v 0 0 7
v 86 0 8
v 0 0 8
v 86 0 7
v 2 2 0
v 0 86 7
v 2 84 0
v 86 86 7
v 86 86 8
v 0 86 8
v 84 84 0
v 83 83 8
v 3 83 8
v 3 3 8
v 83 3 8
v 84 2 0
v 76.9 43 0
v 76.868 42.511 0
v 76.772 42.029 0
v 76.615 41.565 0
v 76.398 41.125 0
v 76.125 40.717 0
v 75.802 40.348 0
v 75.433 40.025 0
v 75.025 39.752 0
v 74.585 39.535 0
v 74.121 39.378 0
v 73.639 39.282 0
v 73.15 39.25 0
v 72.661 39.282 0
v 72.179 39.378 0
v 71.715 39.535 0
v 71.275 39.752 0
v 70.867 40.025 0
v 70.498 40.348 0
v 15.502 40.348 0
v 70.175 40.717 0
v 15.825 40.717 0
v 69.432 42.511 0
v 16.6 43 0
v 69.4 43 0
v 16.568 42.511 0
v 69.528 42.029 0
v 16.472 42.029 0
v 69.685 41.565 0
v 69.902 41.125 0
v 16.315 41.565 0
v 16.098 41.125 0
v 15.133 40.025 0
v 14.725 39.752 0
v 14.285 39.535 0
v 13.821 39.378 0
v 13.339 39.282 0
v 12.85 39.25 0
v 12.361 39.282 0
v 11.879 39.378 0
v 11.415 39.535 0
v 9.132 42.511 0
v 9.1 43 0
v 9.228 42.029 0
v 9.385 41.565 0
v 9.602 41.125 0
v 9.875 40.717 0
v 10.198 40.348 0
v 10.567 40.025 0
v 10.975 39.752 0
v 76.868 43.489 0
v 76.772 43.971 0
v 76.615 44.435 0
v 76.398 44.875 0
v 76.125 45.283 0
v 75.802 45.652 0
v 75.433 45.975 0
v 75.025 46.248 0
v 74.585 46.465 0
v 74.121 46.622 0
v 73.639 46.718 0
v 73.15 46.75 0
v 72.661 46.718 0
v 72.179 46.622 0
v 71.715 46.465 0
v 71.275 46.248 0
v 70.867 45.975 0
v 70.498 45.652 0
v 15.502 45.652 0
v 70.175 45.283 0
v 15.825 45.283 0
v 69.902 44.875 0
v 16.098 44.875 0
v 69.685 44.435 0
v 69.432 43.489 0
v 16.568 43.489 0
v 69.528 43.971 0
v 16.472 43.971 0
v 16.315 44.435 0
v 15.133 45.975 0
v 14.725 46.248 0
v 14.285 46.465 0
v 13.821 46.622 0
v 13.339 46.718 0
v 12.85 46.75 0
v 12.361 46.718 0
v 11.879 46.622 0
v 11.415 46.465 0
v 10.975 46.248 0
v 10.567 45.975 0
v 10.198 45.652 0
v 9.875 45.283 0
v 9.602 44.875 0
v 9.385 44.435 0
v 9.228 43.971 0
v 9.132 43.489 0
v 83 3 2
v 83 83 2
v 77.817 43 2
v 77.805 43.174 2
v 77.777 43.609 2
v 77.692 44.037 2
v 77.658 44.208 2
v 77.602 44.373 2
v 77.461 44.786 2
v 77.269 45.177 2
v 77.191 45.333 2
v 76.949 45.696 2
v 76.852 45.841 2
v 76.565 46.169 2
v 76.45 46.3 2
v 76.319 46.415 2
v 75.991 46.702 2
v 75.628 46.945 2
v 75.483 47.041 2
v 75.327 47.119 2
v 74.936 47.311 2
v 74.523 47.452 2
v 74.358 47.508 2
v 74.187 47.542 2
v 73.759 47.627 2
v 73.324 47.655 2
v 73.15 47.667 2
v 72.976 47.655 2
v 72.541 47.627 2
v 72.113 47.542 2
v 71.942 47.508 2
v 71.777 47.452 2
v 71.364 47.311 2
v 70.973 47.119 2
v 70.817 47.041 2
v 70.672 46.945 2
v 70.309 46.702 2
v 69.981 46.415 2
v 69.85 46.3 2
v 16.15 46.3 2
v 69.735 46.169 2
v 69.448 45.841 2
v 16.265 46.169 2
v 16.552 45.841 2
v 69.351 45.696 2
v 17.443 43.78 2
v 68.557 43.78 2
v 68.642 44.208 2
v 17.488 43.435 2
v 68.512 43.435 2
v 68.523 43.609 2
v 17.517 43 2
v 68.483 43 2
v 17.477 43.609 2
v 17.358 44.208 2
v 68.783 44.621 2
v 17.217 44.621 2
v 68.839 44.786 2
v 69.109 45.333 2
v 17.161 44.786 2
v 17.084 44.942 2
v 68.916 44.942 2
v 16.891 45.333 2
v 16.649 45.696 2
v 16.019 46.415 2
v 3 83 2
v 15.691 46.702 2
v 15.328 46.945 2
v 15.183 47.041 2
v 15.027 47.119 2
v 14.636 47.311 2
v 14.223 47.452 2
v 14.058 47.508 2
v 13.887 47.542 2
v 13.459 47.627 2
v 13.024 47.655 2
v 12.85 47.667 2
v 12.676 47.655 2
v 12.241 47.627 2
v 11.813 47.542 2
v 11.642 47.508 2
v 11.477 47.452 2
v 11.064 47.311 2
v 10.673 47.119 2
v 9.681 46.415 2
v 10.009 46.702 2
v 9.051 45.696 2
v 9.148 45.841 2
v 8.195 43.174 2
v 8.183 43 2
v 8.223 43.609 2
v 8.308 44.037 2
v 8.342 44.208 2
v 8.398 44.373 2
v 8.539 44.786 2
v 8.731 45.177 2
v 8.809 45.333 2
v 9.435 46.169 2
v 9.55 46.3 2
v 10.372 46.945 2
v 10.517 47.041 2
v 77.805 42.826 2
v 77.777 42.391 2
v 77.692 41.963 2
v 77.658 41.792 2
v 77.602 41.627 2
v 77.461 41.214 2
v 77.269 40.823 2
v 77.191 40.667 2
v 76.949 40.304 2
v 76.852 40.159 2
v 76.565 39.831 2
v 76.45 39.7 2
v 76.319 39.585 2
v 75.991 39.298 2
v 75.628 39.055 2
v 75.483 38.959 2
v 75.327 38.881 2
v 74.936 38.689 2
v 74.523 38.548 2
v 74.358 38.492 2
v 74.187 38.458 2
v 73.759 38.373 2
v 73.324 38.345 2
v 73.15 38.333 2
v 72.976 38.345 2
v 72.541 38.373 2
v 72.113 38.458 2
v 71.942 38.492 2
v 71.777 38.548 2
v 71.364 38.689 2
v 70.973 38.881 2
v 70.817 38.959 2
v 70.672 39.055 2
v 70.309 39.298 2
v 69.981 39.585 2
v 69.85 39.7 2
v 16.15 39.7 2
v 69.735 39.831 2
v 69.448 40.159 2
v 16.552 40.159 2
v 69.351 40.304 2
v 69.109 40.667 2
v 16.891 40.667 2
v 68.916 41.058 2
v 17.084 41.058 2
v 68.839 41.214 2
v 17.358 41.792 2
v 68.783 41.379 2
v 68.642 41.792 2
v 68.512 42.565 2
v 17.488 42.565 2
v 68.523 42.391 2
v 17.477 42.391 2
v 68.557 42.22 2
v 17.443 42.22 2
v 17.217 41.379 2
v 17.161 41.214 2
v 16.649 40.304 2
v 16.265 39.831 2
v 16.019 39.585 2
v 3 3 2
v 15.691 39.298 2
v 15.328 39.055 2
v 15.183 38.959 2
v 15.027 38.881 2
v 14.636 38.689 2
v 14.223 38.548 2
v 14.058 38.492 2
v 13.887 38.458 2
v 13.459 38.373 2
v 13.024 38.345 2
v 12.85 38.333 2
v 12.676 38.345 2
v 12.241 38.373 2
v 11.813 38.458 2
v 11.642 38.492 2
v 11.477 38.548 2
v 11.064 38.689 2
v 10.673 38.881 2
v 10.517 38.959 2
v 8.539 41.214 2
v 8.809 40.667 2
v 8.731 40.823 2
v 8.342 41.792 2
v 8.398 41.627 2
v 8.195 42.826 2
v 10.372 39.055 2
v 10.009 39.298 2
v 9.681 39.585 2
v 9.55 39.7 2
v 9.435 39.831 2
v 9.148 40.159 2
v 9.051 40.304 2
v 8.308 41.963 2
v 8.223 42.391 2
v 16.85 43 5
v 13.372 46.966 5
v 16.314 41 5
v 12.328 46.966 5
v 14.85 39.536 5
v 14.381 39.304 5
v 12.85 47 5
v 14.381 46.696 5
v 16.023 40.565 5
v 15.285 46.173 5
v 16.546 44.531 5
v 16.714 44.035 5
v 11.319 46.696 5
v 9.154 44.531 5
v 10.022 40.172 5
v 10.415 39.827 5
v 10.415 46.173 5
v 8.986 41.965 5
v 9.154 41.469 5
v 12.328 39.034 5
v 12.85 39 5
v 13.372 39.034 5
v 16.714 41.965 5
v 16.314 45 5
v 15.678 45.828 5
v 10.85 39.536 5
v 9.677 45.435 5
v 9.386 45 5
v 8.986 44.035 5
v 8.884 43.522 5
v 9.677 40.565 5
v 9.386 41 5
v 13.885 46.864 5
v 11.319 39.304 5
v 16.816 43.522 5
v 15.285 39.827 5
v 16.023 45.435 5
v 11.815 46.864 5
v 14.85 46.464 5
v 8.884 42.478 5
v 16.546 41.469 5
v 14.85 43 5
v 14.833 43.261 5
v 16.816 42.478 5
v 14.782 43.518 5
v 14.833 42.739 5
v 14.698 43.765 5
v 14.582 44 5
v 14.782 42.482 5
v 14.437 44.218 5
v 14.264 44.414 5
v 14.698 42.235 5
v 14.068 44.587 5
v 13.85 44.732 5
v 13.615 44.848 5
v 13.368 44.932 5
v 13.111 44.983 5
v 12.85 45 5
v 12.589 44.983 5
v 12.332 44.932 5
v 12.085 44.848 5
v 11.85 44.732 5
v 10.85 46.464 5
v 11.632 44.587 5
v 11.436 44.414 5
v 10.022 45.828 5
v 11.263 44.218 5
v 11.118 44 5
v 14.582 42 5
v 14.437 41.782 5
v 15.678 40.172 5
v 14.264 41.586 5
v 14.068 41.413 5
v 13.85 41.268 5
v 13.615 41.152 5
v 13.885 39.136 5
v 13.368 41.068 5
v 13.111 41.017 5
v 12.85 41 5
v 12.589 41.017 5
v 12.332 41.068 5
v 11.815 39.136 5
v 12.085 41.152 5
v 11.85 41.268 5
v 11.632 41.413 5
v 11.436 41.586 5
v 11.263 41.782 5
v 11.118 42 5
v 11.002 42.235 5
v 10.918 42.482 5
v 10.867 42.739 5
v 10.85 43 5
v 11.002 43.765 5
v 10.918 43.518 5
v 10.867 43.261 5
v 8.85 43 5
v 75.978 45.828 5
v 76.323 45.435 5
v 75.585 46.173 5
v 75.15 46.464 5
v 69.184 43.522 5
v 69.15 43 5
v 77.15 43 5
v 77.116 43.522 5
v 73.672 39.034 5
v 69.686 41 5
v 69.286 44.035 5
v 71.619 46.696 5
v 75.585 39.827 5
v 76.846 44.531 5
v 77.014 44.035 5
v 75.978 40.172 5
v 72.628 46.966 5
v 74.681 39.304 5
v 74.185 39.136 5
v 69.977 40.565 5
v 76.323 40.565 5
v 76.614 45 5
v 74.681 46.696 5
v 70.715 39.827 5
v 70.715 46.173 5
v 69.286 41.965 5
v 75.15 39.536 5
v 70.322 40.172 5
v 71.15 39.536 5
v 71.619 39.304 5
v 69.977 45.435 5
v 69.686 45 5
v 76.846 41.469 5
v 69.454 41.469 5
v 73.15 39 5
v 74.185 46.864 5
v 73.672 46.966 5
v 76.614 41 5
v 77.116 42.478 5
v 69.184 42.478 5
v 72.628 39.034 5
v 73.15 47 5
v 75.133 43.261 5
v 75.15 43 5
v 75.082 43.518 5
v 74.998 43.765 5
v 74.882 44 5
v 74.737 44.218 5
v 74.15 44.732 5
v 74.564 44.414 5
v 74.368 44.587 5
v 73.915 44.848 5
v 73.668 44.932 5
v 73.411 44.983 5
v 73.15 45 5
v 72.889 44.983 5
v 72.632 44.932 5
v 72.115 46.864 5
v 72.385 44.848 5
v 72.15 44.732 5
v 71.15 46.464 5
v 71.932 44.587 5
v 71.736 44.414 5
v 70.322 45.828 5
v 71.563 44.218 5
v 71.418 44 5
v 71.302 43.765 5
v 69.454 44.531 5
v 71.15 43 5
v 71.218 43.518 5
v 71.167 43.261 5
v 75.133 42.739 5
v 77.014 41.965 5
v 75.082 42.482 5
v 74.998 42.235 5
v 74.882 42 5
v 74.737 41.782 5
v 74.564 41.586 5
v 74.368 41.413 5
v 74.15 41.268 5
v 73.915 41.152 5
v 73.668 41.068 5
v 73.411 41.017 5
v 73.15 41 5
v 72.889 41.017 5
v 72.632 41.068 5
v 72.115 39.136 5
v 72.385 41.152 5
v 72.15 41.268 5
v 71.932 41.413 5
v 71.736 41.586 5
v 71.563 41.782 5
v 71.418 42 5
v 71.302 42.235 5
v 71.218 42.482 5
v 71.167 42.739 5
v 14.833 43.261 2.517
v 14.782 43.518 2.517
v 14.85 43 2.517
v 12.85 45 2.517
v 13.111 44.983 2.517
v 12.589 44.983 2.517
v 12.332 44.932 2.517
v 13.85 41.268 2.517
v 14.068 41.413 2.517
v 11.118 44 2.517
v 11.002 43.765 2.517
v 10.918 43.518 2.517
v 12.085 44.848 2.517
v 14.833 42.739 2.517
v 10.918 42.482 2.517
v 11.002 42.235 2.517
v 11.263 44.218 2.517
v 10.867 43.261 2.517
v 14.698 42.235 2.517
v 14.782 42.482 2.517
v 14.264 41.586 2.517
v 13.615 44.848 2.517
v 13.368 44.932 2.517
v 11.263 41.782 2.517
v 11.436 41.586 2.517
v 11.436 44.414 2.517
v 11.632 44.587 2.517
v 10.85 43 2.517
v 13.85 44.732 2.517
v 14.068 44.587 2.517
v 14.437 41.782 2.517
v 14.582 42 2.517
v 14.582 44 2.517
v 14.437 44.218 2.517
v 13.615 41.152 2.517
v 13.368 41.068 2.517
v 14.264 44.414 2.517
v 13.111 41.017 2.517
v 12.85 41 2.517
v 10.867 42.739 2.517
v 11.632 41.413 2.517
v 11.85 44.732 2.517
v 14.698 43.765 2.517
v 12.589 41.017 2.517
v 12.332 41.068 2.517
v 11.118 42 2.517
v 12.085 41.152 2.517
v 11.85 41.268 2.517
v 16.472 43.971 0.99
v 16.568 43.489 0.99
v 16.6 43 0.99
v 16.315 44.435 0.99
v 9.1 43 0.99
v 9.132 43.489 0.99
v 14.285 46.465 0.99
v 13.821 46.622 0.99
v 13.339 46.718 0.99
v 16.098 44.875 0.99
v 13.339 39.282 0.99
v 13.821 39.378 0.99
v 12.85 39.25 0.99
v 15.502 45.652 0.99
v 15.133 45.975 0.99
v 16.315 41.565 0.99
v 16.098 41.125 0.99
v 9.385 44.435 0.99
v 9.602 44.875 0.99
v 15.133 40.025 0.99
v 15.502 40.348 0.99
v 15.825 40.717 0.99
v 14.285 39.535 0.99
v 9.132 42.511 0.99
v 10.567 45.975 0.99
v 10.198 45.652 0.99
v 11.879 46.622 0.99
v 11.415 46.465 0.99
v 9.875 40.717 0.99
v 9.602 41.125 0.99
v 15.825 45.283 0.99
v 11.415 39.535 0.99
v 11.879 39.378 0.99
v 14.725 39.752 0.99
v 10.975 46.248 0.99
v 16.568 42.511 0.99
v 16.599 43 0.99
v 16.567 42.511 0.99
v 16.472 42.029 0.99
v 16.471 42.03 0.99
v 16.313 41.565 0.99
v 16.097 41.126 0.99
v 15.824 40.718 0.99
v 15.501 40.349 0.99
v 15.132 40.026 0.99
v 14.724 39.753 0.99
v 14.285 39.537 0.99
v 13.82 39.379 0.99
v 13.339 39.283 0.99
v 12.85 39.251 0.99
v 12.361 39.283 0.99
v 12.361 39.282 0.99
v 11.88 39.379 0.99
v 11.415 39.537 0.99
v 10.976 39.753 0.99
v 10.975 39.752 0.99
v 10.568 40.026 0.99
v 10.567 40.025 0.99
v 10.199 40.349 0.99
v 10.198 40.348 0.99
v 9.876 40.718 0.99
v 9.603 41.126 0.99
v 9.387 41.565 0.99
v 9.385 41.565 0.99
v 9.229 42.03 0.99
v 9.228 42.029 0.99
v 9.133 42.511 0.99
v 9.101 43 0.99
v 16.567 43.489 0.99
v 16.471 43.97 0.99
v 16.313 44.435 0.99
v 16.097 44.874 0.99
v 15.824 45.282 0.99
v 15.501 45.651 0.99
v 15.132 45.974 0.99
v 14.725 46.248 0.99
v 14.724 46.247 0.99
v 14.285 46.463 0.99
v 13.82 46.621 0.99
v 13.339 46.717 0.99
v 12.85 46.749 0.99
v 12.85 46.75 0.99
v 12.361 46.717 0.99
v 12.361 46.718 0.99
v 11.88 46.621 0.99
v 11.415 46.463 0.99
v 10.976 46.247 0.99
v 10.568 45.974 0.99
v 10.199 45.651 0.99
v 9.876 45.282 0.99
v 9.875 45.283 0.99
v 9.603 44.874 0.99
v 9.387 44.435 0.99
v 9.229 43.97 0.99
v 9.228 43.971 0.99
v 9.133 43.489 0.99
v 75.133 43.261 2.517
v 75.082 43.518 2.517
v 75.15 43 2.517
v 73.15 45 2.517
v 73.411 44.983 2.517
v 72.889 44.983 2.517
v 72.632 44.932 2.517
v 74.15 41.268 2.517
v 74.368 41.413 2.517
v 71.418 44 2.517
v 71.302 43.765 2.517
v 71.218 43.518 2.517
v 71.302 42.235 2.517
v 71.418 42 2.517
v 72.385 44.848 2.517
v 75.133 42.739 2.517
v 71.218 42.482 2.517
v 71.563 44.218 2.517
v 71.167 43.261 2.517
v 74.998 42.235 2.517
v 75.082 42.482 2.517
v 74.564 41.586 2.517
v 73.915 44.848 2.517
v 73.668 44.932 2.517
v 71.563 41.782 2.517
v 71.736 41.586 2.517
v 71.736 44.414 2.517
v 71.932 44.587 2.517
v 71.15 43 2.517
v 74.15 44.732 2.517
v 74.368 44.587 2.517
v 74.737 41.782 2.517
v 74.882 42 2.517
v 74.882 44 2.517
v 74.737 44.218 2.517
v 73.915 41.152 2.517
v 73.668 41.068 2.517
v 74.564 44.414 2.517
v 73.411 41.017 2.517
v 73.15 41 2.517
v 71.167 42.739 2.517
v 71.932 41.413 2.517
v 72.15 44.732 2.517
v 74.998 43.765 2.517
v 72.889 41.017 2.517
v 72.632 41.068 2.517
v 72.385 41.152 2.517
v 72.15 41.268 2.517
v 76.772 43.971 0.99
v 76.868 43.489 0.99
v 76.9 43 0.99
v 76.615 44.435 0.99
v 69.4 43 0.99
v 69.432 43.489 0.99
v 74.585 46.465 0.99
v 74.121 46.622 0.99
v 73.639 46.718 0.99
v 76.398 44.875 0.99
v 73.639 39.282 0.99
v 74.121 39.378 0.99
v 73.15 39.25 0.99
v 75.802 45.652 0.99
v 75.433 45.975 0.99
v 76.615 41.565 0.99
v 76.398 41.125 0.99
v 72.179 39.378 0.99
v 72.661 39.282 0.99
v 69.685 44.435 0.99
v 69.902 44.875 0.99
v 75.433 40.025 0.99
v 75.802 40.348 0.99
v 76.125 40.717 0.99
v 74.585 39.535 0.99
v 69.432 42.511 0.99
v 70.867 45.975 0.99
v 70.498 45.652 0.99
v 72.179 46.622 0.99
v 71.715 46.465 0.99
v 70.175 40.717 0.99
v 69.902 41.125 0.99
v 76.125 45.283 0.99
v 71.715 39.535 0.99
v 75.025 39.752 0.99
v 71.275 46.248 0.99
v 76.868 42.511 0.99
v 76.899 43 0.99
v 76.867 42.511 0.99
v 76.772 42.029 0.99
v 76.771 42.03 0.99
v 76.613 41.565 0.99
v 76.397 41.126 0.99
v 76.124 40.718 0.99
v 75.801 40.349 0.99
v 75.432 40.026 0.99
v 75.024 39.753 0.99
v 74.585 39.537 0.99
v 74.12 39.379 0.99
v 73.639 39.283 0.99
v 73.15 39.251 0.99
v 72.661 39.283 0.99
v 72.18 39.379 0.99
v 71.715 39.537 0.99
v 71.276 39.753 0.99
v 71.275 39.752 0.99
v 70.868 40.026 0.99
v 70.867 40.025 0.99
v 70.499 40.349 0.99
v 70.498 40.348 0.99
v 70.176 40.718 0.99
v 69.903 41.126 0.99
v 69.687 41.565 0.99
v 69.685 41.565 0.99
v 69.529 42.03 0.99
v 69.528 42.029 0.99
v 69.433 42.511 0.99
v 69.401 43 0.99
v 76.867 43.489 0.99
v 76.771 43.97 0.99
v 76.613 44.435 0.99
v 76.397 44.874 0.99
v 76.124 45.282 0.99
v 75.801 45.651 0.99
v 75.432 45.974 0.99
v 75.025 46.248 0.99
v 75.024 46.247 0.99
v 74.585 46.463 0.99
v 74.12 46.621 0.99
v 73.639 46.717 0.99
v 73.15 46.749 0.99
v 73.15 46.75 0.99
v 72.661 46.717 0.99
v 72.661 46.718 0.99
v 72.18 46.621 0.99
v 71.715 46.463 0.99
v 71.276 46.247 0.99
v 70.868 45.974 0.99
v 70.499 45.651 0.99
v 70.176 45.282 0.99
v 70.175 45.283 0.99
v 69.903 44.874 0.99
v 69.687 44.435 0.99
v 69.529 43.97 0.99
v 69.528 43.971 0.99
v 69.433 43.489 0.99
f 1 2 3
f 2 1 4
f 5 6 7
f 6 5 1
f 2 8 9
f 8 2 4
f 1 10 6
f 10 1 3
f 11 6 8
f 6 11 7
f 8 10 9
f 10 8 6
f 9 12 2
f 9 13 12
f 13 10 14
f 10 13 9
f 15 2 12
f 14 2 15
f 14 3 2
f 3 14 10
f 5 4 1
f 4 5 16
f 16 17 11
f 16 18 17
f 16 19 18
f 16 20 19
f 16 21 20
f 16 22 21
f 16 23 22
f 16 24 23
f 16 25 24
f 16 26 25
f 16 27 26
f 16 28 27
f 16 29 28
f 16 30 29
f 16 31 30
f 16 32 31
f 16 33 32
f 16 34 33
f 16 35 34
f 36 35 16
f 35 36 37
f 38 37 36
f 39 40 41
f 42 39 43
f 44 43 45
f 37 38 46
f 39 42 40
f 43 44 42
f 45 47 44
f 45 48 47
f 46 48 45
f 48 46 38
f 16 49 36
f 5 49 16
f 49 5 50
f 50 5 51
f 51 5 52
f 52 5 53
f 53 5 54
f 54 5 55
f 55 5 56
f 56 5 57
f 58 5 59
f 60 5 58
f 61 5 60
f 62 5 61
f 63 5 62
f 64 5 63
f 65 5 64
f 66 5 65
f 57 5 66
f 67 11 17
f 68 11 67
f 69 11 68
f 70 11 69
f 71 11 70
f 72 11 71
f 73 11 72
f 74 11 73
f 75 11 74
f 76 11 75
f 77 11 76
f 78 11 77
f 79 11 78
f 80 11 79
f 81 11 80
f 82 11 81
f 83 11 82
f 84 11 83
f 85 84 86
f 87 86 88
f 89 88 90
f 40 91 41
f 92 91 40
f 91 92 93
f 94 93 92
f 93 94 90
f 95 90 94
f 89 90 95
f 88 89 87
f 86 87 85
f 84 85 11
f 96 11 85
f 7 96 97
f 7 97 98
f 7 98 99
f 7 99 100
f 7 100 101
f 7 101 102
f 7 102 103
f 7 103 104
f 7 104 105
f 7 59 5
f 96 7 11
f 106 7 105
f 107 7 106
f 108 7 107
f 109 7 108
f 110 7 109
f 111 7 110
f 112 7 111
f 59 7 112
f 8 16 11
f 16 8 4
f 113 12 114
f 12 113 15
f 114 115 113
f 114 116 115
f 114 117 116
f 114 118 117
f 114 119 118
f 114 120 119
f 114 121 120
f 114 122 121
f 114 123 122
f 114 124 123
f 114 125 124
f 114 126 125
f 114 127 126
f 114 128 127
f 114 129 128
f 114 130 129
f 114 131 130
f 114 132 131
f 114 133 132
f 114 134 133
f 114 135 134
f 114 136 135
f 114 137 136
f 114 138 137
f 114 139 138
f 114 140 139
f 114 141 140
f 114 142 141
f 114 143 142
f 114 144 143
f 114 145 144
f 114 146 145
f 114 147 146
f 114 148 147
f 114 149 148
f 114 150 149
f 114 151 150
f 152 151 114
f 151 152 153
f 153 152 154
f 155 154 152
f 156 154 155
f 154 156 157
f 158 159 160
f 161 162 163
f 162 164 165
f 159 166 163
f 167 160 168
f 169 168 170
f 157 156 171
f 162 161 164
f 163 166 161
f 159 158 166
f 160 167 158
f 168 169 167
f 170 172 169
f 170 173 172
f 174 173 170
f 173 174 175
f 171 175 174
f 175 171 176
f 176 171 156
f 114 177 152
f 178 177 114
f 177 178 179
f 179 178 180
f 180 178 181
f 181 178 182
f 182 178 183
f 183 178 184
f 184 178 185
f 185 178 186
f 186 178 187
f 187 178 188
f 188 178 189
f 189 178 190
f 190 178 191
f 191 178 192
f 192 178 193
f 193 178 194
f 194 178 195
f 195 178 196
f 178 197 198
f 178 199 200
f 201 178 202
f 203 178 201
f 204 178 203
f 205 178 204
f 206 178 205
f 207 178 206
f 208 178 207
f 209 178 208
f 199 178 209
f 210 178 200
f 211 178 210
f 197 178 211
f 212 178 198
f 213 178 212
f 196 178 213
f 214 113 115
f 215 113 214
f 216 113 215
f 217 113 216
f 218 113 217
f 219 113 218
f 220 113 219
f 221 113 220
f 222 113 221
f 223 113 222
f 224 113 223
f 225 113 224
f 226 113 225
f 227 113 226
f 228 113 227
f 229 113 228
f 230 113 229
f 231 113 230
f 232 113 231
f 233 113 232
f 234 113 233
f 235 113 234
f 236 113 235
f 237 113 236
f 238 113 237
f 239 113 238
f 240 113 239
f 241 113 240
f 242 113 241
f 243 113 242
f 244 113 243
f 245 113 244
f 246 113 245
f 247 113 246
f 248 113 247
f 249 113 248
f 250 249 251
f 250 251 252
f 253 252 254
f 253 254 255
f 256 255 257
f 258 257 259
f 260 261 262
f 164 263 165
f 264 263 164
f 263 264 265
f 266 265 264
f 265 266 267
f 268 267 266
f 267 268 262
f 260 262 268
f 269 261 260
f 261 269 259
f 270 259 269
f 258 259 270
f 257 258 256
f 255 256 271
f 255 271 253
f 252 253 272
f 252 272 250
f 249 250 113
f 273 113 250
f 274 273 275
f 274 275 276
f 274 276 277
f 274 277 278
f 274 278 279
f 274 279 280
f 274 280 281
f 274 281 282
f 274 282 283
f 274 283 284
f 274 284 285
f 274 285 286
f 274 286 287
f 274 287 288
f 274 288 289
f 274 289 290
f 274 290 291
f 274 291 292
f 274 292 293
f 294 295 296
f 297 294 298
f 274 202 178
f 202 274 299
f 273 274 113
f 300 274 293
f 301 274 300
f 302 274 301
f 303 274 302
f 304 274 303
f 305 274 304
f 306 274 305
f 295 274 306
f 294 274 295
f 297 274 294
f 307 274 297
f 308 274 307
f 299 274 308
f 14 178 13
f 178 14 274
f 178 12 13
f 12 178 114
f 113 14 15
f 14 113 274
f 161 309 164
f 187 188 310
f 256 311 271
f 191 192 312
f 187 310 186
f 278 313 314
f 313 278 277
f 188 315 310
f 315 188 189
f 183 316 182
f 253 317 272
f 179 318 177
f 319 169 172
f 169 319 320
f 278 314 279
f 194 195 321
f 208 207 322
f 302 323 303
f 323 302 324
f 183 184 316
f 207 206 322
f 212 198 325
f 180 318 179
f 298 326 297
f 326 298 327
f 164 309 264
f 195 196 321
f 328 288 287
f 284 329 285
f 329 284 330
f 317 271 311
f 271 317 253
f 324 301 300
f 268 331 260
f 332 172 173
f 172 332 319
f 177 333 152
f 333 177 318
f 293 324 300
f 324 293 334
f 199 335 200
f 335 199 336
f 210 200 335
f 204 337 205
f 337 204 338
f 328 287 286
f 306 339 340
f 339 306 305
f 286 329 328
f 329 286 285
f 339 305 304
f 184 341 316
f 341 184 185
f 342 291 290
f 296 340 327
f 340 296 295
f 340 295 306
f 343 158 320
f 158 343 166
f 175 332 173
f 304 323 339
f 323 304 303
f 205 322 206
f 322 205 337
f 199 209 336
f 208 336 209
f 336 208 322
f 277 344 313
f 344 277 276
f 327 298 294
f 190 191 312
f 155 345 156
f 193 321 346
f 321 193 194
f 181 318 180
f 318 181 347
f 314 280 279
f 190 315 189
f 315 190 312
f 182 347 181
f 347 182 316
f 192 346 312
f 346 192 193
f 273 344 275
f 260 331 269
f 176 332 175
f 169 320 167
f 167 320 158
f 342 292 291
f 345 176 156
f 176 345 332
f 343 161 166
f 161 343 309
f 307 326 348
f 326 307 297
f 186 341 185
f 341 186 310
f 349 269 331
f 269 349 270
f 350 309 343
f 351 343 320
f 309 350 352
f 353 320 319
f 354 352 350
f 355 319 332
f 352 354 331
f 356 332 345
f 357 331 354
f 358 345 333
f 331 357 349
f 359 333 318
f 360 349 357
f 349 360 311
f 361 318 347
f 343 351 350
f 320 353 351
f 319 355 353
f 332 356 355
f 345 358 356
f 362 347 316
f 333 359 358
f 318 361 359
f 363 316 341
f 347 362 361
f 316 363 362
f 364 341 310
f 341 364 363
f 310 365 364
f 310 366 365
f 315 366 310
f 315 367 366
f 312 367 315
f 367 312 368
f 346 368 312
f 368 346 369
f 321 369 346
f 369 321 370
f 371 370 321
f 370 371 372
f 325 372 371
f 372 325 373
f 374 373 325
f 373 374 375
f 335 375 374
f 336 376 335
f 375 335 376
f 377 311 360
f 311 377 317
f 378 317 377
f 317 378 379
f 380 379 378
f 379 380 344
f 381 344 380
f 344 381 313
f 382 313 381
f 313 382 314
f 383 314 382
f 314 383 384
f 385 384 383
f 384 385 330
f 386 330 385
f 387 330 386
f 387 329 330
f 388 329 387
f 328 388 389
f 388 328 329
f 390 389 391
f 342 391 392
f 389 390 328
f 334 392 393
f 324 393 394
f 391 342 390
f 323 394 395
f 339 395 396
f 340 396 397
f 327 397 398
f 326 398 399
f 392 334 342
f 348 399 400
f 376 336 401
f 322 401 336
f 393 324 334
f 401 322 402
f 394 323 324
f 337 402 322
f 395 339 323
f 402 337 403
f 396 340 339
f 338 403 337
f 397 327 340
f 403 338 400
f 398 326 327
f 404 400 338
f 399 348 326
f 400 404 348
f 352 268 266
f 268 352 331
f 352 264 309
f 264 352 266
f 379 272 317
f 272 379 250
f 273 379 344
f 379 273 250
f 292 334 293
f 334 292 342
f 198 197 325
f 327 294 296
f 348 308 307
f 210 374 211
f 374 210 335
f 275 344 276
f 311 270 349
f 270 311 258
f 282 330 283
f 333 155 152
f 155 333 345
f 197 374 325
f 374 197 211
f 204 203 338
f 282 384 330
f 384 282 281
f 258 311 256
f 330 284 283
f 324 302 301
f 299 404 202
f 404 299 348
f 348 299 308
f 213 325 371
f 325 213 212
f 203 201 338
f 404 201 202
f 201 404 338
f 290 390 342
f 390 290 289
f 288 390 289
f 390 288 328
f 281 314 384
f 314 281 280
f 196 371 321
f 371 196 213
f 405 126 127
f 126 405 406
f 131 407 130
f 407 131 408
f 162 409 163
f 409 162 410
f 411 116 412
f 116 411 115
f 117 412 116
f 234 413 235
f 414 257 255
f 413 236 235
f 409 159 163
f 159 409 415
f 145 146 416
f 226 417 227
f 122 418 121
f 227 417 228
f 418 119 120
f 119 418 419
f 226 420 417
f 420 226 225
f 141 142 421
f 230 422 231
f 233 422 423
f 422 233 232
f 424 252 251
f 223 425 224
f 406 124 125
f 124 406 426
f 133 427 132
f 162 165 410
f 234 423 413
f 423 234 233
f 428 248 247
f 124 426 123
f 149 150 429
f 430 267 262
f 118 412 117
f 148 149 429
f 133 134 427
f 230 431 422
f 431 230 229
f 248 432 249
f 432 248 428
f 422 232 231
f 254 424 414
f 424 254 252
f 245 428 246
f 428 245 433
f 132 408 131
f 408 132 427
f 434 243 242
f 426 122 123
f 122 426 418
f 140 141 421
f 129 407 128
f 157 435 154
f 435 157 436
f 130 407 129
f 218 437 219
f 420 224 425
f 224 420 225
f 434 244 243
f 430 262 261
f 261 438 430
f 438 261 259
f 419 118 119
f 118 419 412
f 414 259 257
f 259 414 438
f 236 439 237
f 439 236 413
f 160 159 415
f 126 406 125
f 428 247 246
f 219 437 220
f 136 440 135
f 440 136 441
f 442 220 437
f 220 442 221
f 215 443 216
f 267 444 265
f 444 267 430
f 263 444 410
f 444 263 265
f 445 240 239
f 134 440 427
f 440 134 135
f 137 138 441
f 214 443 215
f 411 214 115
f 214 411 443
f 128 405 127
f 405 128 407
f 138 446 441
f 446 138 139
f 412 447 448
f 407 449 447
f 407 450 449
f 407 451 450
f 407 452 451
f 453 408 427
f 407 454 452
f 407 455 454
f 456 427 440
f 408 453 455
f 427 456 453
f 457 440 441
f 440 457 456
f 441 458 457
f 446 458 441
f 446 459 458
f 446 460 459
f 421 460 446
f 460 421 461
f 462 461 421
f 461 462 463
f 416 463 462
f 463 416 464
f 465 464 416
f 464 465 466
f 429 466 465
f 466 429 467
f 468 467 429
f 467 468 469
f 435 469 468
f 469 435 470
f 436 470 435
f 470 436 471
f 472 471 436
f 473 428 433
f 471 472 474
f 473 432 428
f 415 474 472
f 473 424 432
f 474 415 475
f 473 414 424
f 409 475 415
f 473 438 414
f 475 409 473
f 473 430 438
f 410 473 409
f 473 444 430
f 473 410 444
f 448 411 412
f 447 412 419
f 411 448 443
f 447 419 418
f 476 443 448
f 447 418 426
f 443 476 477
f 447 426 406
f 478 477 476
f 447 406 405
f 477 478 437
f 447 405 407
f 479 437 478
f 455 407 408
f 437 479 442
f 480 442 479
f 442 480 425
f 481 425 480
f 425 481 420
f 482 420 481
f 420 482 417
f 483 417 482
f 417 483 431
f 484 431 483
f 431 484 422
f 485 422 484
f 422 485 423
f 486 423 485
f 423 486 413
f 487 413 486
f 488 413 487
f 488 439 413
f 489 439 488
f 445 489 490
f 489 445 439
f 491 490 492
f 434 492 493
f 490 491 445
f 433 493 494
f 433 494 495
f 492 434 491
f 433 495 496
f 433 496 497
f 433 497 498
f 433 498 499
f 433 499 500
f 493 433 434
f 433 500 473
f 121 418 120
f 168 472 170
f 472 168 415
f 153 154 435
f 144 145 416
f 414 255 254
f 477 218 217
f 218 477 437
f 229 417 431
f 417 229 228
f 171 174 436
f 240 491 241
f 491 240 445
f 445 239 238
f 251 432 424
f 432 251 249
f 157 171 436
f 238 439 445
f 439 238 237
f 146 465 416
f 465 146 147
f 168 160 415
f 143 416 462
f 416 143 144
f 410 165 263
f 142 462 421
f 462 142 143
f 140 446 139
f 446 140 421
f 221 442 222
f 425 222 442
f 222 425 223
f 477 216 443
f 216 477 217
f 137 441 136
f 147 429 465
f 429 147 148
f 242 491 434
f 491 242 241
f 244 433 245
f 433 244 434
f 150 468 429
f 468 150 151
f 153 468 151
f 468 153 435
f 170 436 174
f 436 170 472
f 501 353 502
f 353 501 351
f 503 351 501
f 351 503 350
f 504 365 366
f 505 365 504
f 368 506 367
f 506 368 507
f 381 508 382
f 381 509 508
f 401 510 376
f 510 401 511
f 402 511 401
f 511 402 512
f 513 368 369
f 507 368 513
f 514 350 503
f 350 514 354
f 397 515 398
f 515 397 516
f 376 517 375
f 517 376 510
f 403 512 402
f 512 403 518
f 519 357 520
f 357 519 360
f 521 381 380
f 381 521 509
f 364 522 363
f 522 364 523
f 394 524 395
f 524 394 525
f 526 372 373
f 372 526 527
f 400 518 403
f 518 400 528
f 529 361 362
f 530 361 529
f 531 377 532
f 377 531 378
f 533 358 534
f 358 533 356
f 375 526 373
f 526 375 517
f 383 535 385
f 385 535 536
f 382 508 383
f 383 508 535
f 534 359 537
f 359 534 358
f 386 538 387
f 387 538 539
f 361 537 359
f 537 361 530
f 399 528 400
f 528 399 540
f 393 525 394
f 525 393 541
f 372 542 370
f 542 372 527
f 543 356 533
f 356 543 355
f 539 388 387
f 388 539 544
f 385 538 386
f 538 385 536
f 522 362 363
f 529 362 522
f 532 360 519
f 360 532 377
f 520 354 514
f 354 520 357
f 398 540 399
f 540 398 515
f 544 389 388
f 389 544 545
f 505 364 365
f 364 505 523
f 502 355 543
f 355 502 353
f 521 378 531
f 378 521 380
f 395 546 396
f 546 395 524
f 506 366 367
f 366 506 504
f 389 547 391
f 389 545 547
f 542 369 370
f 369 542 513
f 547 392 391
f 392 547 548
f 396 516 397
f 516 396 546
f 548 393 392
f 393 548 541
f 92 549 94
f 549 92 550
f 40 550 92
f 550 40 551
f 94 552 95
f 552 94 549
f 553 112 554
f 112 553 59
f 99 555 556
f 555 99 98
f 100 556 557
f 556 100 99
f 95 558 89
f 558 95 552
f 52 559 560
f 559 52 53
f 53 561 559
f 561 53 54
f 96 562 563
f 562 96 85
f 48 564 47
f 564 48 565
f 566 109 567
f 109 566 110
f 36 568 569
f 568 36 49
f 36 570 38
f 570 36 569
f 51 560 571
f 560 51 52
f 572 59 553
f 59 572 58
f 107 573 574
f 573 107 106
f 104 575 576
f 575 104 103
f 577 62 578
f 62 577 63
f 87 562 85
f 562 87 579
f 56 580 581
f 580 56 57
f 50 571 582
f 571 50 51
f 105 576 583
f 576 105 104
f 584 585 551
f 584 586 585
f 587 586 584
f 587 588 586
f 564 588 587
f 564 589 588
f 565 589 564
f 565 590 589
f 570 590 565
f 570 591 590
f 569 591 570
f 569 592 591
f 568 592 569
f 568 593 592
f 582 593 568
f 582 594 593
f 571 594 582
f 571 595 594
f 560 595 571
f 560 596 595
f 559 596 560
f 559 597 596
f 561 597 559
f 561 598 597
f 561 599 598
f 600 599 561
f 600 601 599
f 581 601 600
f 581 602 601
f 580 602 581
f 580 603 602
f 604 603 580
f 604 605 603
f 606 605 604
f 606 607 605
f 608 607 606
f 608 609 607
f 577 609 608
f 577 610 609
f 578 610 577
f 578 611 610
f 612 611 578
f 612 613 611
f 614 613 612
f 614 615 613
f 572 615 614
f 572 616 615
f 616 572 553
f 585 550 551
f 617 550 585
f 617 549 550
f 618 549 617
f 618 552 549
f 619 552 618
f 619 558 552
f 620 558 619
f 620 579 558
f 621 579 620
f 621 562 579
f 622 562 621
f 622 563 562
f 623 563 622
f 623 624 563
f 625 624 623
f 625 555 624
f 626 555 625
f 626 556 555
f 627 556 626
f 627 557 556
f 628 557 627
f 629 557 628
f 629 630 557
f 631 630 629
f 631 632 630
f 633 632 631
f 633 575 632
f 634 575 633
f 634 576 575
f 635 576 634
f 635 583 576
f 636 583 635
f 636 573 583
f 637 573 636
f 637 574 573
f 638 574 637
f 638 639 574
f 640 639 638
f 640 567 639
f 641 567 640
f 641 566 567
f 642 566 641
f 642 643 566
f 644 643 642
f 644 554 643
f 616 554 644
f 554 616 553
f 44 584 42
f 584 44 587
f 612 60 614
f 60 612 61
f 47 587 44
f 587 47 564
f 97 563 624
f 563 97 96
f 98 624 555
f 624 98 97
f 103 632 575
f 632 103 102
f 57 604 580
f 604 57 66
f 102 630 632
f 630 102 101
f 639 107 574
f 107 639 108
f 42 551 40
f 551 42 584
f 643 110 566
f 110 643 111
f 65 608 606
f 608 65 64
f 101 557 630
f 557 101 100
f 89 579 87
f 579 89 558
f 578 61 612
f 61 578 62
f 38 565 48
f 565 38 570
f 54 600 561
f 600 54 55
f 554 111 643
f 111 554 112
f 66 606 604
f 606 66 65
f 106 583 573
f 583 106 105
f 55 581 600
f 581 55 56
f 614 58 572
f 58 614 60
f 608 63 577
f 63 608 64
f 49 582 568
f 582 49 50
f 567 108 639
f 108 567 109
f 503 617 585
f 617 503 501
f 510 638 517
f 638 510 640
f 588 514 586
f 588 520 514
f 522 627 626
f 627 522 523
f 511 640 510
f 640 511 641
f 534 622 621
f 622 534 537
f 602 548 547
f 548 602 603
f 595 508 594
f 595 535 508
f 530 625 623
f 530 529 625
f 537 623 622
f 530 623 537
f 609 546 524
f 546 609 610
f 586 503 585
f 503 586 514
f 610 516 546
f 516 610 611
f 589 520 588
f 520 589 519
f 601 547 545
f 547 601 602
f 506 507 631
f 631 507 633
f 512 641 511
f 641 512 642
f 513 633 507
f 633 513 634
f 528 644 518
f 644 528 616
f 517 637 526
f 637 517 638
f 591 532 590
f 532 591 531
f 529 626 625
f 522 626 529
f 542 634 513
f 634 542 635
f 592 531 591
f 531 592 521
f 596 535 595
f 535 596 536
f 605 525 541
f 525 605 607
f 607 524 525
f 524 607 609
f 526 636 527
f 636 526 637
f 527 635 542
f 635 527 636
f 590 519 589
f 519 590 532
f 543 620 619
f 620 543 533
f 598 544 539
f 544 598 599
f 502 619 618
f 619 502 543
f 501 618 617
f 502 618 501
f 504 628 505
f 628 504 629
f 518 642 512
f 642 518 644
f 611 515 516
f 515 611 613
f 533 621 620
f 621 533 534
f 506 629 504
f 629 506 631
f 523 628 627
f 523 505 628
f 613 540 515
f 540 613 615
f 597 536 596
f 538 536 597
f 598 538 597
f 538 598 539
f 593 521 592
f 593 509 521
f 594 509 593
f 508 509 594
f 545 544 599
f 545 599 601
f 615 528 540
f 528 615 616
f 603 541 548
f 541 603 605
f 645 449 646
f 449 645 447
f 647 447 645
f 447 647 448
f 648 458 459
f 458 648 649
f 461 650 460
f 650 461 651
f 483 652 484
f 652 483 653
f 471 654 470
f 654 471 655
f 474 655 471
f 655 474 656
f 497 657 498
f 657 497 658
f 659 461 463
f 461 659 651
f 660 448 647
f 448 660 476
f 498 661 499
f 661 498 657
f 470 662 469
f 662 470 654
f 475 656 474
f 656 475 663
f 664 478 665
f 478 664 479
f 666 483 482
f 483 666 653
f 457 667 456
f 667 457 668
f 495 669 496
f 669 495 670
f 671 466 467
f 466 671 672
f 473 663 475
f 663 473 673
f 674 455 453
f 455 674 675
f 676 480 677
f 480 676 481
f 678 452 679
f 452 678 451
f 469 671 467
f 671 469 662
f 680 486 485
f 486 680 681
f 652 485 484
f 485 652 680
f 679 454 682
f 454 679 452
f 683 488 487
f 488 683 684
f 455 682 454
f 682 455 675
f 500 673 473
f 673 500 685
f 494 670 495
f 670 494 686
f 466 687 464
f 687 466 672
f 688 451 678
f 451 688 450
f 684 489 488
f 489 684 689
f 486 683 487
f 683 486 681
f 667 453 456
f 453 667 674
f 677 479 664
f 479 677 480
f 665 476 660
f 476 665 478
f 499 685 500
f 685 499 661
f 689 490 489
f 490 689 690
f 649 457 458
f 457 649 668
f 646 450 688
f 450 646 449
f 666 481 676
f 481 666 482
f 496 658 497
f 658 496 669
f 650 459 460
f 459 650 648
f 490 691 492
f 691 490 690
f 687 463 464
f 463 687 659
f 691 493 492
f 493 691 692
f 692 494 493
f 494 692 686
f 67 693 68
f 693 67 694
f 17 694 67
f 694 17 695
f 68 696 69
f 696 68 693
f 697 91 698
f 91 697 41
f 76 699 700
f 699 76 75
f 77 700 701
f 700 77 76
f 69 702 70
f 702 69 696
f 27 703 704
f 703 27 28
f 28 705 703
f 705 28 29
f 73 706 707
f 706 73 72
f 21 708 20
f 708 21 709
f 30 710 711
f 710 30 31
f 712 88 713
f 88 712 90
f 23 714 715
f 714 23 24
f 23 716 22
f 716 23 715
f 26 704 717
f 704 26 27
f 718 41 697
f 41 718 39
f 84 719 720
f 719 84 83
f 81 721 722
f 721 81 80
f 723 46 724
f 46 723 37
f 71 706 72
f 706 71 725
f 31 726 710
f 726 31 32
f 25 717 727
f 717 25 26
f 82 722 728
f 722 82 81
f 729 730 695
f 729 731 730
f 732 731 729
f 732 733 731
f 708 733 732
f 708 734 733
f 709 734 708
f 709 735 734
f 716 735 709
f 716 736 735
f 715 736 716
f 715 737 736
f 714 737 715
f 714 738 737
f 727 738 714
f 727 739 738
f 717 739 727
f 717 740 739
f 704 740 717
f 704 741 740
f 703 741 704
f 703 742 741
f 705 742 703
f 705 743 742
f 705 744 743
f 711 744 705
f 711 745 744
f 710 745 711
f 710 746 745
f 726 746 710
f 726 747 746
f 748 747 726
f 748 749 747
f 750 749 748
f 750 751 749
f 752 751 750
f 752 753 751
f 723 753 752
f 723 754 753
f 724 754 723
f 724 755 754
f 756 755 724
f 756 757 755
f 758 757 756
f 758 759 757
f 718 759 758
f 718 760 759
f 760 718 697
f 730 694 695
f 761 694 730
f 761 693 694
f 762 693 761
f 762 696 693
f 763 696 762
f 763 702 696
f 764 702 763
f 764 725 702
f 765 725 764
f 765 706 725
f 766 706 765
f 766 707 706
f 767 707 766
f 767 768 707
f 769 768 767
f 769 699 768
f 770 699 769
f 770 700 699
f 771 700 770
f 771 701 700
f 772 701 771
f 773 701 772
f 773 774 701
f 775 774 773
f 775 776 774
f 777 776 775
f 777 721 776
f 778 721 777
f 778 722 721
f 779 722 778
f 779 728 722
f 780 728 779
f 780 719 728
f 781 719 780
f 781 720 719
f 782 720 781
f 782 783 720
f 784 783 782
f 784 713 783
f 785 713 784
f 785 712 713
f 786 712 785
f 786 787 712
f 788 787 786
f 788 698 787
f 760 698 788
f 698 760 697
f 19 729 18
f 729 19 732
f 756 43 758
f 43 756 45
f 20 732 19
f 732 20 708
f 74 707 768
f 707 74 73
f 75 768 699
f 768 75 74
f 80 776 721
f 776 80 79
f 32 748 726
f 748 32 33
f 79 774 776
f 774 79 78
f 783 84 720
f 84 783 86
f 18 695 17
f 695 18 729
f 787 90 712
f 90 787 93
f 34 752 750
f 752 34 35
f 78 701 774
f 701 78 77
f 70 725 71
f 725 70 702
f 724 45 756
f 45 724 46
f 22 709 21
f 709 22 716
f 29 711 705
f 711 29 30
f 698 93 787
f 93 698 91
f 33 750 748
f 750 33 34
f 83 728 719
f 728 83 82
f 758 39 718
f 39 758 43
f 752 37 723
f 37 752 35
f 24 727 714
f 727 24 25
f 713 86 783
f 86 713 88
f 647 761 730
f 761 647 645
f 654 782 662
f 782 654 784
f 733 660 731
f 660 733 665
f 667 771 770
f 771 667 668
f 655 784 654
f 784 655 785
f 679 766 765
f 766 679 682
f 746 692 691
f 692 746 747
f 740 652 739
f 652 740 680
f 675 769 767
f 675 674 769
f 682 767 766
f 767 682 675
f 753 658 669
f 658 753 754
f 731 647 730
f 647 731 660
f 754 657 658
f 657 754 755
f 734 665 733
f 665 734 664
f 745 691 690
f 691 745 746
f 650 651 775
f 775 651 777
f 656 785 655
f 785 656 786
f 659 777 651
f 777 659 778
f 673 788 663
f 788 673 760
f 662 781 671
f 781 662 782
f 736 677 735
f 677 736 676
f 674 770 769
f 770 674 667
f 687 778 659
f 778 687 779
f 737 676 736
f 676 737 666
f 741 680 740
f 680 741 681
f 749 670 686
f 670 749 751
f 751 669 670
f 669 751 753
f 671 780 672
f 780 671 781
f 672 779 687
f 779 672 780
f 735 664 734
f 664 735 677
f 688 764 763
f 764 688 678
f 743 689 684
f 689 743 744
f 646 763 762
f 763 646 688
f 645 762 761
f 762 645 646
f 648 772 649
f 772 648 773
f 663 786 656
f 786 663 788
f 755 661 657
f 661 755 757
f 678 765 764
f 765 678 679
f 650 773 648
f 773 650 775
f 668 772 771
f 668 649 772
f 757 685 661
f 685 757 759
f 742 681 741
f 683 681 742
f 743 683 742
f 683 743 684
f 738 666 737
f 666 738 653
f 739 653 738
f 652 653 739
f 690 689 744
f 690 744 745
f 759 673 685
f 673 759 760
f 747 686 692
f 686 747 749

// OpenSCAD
difference()
{ // UK socket blank plate
	union()
	{
		difference()
		{
			hull()
			{
				translate([2,2,0])cube([82,82,1]);
				translate([0,0,7])cube([86,86,1]);
			}
			translate([3,3,2])cube([80,80,10]);
		}
		for(x=[12.85,73.15])translate([x,43,0.5])cylinder(d1=10,d2=8,h=4.5,$fn=48);
	}
	for(x=[12.85,73.15])translate([x,43,-0.01])
	{
		cylinder(d=4,h=10,$fn=48);
		cylinder(d=7.5,h=1,$fn=48);
		translate([0,0,0.999])cylinder(d1=7.5,d2=0,h=3.275,$fn=48);
	}
}
